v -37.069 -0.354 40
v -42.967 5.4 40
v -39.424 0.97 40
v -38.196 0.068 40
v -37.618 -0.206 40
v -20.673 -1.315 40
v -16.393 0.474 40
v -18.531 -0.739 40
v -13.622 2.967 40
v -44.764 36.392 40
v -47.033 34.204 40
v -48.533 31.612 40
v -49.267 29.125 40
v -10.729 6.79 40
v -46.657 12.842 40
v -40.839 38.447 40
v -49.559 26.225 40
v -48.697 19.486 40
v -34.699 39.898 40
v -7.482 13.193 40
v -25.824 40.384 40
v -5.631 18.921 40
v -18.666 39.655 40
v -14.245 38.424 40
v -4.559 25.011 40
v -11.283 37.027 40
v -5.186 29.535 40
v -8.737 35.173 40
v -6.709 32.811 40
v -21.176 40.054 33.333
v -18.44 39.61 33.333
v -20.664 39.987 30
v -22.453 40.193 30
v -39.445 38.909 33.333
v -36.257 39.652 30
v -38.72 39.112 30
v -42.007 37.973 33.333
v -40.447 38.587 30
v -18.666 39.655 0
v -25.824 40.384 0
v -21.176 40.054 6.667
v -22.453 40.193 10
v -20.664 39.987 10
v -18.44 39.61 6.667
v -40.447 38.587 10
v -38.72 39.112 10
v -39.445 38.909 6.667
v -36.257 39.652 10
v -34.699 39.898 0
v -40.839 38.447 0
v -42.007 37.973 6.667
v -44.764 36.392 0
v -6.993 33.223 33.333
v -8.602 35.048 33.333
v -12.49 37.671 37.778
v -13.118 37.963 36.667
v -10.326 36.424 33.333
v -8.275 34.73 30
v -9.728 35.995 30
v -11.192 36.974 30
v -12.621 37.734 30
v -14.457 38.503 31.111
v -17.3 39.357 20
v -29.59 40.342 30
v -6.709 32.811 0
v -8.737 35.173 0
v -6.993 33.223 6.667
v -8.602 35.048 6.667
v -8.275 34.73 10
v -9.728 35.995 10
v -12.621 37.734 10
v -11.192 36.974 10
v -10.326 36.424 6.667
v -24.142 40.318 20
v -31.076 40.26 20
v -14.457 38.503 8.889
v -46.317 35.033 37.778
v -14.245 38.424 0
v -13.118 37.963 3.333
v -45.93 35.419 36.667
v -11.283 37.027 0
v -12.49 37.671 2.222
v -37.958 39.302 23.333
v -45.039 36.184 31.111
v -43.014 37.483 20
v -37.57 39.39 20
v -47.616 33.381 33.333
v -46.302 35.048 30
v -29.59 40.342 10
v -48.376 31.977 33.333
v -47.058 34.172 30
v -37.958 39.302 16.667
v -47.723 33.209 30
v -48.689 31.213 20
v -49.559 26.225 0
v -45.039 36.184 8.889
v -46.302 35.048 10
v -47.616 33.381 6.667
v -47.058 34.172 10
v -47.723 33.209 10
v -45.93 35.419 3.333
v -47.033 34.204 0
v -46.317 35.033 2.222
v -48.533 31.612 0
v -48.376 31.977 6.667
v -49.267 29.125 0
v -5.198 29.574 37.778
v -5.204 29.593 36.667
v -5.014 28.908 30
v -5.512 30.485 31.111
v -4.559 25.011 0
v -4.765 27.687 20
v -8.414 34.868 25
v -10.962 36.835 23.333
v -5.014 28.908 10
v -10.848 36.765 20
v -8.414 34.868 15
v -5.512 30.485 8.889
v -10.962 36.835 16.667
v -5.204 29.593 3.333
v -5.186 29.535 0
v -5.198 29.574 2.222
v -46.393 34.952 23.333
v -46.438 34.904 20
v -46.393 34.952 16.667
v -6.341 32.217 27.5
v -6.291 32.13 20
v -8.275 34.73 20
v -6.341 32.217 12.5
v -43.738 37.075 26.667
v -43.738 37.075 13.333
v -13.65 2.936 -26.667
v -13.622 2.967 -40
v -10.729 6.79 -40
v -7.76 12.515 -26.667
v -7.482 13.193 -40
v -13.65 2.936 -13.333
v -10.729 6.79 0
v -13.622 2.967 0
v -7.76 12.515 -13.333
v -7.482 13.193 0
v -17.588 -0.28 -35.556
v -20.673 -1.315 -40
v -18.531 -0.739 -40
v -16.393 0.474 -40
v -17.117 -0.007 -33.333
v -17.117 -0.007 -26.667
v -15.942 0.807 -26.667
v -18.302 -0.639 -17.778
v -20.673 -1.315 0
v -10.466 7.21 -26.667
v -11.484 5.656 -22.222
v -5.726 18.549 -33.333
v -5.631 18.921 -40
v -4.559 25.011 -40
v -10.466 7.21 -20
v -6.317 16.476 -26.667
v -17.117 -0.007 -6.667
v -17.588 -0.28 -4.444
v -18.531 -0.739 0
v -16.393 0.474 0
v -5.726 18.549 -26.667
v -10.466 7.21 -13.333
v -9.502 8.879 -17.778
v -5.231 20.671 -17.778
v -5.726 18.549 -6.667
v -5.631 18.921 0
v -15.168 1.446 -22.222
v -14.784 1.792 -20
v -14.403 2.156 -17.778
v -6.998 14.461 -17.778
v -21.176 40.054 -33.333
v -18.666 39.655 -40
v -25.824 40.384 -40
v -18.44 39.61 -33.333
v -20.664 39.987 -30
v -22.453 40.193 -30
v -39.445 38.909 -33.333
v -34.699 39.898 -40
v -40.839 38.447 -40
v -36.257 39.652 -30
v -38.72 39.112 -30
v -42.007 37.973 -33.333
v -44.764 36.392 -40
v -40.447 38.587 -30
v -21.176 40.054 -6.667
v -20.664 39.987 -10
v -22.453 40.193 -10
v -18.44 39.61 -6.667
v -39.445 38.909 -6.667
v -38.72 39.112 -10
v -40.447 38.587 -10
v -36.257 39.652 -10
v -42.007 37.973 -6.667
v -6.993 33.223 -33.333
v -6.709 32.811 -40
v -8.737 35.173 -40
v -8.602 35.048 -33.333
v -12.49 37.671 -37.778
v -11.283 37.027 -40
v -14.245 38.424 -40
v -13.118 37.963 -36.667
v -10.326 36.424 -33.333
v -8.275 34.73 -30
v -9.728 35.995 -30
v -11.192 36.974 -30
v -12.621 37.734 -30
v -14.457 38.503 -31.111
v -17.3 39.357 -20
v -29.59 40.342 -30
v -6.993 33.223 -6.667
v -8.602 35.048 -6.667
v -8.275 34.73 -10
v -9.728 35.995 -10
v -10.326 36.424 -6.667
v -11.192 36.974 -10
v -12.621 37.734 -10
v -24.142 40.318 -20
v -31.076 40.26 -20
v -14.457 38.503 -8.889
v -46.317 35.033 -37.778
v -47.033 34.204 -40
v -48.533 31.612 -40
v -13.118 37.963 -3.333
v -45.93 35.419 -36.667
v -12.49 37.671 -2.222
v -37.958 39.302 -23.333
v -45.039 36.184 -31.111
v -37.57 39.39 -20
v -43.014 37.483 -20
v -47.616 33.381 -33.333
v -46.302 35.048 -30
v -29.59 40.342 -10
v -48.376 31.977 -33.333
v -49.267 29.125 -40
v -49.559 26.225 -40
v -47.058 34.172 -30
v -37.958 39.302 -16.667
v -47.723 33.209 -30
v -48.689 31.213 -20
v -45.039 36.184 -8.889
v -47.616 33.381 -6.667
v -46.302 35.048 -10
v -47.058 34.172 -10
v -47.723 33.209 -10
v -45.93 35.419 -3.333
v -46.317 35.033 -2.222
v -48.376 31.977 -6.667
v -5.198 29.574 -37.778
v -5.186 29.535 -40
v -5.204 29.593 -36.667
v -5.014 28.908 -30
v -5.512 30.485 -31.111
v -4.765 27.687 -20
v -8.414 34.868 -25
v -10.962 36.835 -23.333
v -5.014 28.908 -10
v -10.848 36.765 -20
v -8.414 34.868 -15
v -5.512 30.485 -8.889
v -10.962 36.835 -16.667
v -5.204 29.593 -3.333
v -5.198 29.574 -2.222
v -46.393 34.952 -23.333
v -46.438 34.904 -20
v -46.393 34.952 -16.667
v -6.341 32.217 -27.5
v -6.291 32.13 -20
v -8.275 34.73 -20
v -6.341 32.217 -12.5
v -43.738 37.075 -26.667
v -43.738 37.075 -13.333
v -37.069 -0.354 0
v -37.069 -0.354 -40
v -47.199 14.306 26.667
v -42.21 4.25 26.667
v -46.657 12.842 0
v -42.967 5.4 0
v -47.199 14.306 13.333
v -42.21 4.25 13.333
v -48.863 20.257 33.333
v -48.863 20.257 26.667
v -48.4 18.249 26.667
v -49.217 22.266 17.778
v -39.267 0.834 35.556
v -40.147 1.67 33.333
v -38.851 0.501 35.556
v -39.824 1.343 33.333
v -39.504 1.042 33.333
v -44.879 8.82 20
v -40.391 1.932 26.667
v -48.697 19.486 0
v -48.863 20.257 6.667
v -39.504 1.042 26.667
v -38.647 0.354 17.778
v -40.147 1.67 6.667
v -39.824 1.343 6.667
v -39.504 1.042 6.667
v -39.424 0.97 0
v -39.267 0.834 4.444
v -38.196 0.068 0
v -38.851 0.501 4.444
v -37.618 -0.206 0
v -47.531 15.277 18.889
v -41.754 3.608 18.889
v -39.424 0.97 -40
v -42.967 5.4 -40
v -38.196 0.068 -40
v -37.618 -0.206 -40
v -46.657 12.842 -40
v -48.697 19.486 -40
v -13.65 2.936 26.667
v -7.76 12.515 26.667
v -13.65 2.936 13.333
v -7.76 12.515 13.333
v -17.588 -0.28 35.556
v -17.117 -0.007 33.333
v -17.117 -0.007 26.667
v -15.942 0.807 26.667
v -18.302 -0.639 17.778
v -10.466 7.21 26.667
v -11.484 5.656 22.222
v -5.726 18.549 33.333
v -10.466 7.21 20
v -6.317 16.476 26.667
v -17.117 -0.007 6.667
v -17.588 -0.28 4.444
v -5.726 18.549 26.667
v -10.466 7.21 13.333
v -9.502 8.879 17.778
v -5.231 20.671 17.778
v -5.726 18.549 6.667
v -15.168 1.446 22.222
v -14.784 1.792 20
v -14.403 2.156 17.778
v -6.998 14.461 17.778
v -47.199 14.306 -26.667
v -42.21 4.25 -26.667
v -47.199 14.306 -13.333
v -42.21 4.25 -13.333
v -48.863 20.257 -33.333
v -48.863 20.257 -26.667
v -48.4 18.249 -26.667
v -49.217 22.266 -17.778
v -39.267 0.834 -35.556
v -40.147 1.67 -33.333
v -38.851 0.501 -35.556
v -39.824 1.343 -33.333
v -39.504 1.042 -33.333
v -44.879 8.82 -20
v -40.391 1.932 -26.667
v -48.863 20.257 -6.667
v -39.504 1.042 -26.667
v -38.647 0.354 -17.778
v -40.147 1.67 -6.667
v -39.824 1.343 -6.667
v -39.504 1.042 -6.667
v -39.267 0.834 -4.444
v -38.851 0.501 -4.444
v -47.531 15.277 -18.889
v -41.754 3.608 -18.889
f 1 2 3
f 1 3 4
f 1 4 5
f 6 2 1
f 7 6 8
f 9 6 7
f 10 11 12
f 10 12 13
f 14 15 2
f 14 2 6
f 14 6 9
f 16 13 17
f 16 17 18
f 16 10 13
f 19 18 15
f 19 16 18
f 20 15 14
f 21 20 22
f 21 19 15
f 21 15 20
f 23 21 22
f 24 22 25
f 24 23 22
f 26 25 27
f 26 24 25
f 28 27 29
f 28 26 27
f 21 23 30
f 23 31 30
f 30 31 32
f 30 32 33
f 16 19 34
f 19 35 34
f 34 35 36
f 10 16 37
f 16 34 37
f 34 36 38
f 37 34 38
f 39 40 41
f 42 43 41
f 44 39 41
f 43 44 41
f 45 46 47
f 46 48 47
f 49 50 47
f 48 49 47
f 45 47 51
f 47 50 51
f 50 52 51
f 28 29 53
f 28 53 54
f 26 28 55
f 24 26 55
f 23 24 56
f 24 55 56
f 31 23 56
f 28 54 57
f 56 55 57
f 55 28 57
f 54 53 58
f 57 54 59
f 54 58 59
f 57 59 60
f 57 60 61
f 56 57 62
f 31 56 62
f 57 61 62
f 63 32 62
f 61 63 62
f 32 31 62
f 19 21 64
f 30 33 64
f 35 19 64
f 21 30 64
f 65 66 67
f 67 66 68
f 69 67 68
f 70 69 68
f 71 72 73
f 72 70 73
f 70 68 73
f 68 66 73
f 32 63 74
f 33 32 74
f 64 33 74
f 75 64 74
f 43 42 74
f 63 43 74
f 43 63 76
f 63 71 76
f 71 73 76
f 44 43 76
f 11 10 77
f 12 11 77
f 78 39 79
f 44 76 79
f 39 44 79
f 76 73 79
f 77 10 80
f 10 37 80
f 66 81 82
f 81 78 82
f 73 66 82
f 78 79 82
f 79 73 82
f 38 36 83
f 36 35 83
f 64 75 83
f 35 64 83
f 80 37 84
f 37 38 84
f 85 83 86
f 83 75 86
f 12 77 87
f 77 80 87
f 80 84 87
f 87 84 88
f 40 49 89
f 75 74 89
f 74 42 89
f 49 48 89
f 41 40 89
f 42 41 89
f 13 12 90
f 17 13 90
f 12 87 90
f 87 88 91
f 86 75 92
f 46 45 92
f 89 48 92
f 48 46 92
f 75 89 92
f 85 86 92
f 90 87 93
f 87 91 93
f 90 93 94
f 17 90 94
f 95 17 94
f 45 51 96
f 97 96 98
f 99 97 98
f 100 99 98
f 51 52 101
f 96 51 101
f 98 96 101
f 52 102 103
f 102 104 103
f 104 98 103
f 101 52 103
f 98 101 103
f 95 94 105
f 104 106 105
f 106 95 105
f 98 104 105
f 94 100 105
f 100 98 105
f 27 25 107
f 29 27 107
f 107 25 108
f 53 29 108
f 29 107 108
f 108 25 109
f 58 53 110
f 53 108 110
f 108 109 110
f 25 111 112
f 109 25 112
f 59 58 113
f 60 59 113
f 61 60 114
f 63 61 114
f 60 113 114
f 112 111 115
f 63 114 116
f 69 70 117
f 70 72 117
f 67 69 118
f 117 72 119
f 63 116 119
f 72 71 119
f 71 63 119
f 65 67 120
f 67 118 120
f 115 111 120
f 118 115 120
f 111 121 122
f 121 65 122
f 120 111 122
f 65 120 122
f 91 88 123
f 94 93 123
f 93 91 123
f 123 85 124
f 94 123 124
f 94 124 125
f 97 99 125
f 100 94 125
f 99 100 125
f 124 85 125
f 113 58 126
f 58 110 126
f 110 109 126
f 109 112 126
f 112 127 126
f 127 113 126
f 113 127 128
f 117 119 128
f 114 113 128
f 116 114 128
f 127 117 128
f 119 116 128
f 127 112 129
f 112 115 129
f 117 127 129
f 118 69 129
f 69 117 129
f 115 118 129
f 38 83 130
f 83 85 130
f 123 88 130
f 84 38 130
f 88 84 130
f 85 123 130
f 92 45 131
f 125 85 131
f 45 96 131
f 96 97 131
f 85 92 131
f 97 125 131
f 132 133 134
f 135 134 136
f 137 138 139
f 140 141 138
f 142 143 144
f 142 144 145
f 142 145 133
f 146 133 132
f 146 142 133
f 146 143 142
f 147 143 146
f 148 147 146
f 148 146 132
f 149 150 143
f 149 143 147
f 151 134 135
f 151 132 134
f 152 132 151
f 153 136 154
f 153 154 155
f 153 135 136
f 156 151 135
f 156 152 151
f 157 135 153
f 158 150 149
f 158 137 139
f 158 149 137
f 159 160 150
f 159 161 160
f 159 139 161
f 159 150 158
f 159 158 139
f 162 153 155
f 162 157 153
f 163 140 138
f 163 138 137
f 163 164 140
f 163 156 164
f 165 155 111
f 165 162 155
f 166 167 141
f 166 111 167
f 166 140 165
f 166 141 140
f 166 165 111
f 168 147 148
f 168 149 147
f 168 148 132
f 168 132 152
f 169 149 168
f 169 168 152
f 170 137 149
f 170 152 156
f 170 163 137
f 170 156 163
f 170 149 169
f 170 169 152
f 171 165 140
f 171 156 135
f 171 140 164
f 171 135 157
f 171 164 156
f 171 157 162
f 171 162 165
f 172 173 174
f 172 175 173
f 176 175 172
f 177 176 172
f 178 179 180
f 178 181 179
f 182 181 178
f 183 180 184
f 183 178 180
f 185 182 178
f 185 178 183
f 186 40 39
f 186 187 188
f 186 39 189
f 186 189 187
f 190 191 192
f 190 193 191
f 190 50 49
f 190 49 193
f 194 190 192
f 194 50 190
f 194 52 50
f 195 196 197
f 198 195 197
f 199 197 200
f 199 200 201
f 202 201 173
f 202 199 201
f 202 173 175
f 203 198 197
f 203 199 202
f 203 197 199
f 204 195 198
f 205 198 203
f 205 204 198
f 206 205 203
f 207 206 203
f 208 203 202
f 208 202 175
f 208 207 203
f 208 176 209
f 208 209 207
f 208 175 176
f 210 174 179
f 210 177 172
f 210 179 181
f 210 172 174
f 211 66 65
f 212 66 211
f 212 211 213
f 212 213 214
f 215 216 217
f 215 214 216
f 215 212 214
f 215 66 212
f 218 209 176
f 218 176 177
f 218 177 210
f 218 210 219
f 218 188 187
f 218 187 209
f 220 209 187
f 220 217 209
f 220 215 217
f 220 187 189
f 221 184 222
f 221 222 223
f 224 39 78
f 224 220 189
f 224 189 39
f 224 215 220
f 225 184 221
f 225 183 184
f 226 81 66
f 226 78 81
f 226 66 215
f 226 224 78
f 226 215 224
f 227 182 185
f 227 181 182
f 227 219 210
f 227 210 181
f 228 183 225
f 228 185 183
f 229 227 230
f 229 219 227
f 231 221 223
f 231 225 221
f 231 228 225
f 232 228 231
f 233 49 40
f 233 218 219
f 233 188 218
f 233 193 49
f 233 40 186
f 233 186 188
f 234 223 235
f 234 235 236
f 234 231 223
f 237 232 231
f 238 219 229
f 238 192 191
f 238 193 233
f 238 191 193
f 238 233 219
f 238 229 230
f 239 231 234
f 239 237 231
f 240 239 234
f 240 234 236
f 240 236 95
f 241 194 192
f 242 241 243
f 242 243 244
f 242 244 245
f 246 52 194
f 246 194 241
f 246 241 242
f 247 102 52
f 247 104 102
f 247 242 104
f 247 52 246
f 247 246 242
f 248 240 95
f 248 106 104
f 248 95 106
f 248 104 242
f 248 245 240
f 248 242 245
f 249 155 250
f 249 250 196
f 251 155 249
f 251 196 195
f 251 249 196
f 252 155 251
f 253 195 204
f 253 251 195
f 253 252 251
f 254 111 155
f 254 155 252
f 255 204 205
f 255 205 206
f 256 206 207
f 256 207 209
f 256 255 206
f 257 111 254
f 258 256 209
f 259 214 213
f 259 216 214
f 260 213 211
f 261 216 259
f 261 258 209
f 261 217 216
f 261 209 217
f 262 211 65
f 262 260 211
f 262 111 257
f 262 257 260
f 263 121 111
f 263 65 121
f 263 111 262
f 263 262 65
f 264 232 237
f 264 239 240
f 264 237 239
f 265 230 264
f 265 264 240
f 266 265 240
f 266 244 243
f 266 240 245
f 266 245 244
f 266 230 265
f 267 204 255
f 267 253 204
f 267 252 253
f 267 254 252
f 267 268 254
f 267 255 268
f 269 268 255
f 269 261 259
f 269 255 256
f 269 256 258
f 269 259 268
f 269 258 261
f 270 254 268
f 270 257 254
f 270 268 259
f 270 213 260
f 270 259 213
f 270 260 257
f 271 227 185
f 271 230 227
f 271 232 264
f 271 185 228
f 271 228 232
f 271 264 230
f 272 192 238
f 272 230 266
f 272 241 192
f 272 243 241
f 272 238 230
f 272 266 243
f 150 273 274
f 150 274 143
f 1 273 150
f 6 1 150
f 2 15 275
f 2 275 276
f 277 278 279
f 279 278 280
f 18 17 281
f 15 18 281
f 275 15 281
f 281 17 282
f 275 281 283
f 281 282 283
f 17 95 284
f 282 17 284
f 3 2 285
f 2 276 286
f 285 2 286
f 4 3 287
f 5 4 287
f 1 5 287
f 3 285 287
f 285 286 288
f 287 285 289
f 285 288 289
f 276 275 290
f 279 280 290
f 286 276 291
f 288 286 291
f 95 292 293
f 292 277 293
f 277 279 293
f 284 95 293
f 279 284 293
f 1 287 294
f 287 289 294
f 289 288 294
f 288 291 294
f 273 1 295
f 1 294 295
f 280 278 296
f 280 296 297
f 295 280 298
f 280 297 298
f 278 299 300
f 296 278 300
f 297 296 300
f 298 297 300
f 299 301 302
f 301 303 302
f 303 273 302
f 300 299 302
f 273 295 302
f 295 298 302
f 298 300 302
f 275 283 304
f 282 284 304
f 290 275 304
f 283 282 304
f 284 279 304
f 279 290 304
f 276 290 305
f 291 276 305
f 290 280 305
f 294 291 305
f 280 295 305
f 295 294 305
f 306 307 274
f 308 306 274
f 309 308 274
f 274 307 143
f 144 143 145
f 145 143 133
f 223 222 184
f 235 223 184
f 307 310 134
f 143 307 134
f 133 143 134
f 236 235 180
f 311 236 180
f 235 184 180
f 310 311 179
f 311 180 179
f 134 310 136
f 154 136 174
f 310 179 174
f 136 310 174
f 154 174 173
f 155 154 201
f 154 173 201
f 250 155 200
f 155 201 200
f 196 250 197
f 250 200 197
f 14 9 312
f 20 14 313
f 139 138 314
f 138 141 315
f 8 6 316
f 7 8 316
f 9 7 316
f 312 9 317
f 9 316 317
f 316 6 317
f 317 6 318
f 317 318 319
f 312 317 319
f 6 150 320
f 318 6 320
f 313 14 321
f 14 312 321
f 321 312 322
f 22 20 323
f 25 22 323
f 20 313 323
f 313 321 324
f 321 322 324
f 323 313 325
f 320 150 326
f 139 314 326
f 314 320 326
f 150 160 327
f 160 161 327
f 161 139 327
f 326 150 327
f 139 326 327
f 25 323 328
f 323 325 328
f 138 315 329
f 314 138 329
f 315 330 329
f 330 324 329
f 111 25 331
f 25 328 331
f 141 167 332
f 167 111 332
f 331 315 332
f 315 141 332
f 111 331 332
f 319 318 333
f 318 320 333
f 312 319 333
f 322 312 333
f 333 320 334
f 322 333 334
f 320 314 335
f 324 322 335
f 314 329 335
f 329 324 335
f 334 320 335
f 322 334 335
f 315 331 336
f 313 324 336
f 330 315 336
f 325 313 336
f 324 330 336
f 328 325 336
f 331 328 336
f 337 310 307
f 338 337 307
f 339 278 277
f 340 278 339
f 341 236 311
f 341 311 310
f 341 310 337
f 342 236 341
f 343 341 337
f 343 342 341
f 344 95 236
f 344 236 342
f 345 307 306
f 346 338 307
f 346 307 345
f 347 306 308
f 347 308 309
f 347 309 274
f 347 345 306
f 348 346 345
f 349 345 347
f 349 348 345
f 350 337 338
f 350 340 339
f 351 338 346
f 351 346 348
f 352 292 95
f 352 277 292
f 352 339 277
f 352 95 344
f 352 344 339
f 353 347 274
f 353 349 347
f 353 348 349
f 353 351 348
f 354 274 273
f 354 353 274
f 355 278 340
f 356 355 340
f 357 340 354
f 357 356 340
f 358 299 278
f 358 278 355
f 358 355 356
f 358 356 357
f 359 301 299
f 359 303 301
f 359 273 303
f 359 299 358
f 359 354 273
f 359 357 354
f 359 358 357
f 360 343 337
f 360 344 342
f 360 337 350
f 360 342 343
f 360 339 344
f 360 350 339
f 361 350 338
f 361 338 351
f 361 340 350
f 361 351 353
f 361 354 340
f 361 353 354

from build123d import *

# Parameters (mm, degrees)
F1_DEPTH = 40


with BuildPart() as f1:
    # F0 (on Top) → F1 (new body, symmetric)
    with BuildSketch(Plane.XY):
        with BuildLine():
            Line((-37.0693238298, -0.353665148), (-20.6729808854, -1.3146235742))
            add(Edge.make_bspline(
                [(-20.6729808854, -1.3146235742), (-13.6032438181, -0.5337493481), (-5.896365814, 11.8618648602), (-4.5588211715, 25.0108768476)],
                knots=[0, 0, 0, 0, 30.8658081984, 30.8658081984, 30.8658081984, 30.8658081984], degree=3))
            add(Edge.make_bspline(
                [(-4.5588211715, 25.0108768476), (-4.5758133079, 38.760371), (-32.1204350581, 43.0454651832), (-49.3615237504, 36.5462416672), (-49.5588211715, 26.2250770552)],
                knots=[0, 0, 0, 0, 0.5344640568, 1, 1, 1, 1], degree=3))
            add(Edge.make_bspline(
                [(-49.5588211715, 26.2250770552), (-49.3397621475, 14.5697618523), (-41.4605722124, 0.3275985737), (-37.0693238298, -0.353665148)],
                knots=[0, 0, 0, 0, 29.3669385697, 29.3669385697, 29.3669385697, 29.3669385697], degree=3))
        make_face()
    extrude(amount=F1_DEPTH, both=True)


solid = f1.part
